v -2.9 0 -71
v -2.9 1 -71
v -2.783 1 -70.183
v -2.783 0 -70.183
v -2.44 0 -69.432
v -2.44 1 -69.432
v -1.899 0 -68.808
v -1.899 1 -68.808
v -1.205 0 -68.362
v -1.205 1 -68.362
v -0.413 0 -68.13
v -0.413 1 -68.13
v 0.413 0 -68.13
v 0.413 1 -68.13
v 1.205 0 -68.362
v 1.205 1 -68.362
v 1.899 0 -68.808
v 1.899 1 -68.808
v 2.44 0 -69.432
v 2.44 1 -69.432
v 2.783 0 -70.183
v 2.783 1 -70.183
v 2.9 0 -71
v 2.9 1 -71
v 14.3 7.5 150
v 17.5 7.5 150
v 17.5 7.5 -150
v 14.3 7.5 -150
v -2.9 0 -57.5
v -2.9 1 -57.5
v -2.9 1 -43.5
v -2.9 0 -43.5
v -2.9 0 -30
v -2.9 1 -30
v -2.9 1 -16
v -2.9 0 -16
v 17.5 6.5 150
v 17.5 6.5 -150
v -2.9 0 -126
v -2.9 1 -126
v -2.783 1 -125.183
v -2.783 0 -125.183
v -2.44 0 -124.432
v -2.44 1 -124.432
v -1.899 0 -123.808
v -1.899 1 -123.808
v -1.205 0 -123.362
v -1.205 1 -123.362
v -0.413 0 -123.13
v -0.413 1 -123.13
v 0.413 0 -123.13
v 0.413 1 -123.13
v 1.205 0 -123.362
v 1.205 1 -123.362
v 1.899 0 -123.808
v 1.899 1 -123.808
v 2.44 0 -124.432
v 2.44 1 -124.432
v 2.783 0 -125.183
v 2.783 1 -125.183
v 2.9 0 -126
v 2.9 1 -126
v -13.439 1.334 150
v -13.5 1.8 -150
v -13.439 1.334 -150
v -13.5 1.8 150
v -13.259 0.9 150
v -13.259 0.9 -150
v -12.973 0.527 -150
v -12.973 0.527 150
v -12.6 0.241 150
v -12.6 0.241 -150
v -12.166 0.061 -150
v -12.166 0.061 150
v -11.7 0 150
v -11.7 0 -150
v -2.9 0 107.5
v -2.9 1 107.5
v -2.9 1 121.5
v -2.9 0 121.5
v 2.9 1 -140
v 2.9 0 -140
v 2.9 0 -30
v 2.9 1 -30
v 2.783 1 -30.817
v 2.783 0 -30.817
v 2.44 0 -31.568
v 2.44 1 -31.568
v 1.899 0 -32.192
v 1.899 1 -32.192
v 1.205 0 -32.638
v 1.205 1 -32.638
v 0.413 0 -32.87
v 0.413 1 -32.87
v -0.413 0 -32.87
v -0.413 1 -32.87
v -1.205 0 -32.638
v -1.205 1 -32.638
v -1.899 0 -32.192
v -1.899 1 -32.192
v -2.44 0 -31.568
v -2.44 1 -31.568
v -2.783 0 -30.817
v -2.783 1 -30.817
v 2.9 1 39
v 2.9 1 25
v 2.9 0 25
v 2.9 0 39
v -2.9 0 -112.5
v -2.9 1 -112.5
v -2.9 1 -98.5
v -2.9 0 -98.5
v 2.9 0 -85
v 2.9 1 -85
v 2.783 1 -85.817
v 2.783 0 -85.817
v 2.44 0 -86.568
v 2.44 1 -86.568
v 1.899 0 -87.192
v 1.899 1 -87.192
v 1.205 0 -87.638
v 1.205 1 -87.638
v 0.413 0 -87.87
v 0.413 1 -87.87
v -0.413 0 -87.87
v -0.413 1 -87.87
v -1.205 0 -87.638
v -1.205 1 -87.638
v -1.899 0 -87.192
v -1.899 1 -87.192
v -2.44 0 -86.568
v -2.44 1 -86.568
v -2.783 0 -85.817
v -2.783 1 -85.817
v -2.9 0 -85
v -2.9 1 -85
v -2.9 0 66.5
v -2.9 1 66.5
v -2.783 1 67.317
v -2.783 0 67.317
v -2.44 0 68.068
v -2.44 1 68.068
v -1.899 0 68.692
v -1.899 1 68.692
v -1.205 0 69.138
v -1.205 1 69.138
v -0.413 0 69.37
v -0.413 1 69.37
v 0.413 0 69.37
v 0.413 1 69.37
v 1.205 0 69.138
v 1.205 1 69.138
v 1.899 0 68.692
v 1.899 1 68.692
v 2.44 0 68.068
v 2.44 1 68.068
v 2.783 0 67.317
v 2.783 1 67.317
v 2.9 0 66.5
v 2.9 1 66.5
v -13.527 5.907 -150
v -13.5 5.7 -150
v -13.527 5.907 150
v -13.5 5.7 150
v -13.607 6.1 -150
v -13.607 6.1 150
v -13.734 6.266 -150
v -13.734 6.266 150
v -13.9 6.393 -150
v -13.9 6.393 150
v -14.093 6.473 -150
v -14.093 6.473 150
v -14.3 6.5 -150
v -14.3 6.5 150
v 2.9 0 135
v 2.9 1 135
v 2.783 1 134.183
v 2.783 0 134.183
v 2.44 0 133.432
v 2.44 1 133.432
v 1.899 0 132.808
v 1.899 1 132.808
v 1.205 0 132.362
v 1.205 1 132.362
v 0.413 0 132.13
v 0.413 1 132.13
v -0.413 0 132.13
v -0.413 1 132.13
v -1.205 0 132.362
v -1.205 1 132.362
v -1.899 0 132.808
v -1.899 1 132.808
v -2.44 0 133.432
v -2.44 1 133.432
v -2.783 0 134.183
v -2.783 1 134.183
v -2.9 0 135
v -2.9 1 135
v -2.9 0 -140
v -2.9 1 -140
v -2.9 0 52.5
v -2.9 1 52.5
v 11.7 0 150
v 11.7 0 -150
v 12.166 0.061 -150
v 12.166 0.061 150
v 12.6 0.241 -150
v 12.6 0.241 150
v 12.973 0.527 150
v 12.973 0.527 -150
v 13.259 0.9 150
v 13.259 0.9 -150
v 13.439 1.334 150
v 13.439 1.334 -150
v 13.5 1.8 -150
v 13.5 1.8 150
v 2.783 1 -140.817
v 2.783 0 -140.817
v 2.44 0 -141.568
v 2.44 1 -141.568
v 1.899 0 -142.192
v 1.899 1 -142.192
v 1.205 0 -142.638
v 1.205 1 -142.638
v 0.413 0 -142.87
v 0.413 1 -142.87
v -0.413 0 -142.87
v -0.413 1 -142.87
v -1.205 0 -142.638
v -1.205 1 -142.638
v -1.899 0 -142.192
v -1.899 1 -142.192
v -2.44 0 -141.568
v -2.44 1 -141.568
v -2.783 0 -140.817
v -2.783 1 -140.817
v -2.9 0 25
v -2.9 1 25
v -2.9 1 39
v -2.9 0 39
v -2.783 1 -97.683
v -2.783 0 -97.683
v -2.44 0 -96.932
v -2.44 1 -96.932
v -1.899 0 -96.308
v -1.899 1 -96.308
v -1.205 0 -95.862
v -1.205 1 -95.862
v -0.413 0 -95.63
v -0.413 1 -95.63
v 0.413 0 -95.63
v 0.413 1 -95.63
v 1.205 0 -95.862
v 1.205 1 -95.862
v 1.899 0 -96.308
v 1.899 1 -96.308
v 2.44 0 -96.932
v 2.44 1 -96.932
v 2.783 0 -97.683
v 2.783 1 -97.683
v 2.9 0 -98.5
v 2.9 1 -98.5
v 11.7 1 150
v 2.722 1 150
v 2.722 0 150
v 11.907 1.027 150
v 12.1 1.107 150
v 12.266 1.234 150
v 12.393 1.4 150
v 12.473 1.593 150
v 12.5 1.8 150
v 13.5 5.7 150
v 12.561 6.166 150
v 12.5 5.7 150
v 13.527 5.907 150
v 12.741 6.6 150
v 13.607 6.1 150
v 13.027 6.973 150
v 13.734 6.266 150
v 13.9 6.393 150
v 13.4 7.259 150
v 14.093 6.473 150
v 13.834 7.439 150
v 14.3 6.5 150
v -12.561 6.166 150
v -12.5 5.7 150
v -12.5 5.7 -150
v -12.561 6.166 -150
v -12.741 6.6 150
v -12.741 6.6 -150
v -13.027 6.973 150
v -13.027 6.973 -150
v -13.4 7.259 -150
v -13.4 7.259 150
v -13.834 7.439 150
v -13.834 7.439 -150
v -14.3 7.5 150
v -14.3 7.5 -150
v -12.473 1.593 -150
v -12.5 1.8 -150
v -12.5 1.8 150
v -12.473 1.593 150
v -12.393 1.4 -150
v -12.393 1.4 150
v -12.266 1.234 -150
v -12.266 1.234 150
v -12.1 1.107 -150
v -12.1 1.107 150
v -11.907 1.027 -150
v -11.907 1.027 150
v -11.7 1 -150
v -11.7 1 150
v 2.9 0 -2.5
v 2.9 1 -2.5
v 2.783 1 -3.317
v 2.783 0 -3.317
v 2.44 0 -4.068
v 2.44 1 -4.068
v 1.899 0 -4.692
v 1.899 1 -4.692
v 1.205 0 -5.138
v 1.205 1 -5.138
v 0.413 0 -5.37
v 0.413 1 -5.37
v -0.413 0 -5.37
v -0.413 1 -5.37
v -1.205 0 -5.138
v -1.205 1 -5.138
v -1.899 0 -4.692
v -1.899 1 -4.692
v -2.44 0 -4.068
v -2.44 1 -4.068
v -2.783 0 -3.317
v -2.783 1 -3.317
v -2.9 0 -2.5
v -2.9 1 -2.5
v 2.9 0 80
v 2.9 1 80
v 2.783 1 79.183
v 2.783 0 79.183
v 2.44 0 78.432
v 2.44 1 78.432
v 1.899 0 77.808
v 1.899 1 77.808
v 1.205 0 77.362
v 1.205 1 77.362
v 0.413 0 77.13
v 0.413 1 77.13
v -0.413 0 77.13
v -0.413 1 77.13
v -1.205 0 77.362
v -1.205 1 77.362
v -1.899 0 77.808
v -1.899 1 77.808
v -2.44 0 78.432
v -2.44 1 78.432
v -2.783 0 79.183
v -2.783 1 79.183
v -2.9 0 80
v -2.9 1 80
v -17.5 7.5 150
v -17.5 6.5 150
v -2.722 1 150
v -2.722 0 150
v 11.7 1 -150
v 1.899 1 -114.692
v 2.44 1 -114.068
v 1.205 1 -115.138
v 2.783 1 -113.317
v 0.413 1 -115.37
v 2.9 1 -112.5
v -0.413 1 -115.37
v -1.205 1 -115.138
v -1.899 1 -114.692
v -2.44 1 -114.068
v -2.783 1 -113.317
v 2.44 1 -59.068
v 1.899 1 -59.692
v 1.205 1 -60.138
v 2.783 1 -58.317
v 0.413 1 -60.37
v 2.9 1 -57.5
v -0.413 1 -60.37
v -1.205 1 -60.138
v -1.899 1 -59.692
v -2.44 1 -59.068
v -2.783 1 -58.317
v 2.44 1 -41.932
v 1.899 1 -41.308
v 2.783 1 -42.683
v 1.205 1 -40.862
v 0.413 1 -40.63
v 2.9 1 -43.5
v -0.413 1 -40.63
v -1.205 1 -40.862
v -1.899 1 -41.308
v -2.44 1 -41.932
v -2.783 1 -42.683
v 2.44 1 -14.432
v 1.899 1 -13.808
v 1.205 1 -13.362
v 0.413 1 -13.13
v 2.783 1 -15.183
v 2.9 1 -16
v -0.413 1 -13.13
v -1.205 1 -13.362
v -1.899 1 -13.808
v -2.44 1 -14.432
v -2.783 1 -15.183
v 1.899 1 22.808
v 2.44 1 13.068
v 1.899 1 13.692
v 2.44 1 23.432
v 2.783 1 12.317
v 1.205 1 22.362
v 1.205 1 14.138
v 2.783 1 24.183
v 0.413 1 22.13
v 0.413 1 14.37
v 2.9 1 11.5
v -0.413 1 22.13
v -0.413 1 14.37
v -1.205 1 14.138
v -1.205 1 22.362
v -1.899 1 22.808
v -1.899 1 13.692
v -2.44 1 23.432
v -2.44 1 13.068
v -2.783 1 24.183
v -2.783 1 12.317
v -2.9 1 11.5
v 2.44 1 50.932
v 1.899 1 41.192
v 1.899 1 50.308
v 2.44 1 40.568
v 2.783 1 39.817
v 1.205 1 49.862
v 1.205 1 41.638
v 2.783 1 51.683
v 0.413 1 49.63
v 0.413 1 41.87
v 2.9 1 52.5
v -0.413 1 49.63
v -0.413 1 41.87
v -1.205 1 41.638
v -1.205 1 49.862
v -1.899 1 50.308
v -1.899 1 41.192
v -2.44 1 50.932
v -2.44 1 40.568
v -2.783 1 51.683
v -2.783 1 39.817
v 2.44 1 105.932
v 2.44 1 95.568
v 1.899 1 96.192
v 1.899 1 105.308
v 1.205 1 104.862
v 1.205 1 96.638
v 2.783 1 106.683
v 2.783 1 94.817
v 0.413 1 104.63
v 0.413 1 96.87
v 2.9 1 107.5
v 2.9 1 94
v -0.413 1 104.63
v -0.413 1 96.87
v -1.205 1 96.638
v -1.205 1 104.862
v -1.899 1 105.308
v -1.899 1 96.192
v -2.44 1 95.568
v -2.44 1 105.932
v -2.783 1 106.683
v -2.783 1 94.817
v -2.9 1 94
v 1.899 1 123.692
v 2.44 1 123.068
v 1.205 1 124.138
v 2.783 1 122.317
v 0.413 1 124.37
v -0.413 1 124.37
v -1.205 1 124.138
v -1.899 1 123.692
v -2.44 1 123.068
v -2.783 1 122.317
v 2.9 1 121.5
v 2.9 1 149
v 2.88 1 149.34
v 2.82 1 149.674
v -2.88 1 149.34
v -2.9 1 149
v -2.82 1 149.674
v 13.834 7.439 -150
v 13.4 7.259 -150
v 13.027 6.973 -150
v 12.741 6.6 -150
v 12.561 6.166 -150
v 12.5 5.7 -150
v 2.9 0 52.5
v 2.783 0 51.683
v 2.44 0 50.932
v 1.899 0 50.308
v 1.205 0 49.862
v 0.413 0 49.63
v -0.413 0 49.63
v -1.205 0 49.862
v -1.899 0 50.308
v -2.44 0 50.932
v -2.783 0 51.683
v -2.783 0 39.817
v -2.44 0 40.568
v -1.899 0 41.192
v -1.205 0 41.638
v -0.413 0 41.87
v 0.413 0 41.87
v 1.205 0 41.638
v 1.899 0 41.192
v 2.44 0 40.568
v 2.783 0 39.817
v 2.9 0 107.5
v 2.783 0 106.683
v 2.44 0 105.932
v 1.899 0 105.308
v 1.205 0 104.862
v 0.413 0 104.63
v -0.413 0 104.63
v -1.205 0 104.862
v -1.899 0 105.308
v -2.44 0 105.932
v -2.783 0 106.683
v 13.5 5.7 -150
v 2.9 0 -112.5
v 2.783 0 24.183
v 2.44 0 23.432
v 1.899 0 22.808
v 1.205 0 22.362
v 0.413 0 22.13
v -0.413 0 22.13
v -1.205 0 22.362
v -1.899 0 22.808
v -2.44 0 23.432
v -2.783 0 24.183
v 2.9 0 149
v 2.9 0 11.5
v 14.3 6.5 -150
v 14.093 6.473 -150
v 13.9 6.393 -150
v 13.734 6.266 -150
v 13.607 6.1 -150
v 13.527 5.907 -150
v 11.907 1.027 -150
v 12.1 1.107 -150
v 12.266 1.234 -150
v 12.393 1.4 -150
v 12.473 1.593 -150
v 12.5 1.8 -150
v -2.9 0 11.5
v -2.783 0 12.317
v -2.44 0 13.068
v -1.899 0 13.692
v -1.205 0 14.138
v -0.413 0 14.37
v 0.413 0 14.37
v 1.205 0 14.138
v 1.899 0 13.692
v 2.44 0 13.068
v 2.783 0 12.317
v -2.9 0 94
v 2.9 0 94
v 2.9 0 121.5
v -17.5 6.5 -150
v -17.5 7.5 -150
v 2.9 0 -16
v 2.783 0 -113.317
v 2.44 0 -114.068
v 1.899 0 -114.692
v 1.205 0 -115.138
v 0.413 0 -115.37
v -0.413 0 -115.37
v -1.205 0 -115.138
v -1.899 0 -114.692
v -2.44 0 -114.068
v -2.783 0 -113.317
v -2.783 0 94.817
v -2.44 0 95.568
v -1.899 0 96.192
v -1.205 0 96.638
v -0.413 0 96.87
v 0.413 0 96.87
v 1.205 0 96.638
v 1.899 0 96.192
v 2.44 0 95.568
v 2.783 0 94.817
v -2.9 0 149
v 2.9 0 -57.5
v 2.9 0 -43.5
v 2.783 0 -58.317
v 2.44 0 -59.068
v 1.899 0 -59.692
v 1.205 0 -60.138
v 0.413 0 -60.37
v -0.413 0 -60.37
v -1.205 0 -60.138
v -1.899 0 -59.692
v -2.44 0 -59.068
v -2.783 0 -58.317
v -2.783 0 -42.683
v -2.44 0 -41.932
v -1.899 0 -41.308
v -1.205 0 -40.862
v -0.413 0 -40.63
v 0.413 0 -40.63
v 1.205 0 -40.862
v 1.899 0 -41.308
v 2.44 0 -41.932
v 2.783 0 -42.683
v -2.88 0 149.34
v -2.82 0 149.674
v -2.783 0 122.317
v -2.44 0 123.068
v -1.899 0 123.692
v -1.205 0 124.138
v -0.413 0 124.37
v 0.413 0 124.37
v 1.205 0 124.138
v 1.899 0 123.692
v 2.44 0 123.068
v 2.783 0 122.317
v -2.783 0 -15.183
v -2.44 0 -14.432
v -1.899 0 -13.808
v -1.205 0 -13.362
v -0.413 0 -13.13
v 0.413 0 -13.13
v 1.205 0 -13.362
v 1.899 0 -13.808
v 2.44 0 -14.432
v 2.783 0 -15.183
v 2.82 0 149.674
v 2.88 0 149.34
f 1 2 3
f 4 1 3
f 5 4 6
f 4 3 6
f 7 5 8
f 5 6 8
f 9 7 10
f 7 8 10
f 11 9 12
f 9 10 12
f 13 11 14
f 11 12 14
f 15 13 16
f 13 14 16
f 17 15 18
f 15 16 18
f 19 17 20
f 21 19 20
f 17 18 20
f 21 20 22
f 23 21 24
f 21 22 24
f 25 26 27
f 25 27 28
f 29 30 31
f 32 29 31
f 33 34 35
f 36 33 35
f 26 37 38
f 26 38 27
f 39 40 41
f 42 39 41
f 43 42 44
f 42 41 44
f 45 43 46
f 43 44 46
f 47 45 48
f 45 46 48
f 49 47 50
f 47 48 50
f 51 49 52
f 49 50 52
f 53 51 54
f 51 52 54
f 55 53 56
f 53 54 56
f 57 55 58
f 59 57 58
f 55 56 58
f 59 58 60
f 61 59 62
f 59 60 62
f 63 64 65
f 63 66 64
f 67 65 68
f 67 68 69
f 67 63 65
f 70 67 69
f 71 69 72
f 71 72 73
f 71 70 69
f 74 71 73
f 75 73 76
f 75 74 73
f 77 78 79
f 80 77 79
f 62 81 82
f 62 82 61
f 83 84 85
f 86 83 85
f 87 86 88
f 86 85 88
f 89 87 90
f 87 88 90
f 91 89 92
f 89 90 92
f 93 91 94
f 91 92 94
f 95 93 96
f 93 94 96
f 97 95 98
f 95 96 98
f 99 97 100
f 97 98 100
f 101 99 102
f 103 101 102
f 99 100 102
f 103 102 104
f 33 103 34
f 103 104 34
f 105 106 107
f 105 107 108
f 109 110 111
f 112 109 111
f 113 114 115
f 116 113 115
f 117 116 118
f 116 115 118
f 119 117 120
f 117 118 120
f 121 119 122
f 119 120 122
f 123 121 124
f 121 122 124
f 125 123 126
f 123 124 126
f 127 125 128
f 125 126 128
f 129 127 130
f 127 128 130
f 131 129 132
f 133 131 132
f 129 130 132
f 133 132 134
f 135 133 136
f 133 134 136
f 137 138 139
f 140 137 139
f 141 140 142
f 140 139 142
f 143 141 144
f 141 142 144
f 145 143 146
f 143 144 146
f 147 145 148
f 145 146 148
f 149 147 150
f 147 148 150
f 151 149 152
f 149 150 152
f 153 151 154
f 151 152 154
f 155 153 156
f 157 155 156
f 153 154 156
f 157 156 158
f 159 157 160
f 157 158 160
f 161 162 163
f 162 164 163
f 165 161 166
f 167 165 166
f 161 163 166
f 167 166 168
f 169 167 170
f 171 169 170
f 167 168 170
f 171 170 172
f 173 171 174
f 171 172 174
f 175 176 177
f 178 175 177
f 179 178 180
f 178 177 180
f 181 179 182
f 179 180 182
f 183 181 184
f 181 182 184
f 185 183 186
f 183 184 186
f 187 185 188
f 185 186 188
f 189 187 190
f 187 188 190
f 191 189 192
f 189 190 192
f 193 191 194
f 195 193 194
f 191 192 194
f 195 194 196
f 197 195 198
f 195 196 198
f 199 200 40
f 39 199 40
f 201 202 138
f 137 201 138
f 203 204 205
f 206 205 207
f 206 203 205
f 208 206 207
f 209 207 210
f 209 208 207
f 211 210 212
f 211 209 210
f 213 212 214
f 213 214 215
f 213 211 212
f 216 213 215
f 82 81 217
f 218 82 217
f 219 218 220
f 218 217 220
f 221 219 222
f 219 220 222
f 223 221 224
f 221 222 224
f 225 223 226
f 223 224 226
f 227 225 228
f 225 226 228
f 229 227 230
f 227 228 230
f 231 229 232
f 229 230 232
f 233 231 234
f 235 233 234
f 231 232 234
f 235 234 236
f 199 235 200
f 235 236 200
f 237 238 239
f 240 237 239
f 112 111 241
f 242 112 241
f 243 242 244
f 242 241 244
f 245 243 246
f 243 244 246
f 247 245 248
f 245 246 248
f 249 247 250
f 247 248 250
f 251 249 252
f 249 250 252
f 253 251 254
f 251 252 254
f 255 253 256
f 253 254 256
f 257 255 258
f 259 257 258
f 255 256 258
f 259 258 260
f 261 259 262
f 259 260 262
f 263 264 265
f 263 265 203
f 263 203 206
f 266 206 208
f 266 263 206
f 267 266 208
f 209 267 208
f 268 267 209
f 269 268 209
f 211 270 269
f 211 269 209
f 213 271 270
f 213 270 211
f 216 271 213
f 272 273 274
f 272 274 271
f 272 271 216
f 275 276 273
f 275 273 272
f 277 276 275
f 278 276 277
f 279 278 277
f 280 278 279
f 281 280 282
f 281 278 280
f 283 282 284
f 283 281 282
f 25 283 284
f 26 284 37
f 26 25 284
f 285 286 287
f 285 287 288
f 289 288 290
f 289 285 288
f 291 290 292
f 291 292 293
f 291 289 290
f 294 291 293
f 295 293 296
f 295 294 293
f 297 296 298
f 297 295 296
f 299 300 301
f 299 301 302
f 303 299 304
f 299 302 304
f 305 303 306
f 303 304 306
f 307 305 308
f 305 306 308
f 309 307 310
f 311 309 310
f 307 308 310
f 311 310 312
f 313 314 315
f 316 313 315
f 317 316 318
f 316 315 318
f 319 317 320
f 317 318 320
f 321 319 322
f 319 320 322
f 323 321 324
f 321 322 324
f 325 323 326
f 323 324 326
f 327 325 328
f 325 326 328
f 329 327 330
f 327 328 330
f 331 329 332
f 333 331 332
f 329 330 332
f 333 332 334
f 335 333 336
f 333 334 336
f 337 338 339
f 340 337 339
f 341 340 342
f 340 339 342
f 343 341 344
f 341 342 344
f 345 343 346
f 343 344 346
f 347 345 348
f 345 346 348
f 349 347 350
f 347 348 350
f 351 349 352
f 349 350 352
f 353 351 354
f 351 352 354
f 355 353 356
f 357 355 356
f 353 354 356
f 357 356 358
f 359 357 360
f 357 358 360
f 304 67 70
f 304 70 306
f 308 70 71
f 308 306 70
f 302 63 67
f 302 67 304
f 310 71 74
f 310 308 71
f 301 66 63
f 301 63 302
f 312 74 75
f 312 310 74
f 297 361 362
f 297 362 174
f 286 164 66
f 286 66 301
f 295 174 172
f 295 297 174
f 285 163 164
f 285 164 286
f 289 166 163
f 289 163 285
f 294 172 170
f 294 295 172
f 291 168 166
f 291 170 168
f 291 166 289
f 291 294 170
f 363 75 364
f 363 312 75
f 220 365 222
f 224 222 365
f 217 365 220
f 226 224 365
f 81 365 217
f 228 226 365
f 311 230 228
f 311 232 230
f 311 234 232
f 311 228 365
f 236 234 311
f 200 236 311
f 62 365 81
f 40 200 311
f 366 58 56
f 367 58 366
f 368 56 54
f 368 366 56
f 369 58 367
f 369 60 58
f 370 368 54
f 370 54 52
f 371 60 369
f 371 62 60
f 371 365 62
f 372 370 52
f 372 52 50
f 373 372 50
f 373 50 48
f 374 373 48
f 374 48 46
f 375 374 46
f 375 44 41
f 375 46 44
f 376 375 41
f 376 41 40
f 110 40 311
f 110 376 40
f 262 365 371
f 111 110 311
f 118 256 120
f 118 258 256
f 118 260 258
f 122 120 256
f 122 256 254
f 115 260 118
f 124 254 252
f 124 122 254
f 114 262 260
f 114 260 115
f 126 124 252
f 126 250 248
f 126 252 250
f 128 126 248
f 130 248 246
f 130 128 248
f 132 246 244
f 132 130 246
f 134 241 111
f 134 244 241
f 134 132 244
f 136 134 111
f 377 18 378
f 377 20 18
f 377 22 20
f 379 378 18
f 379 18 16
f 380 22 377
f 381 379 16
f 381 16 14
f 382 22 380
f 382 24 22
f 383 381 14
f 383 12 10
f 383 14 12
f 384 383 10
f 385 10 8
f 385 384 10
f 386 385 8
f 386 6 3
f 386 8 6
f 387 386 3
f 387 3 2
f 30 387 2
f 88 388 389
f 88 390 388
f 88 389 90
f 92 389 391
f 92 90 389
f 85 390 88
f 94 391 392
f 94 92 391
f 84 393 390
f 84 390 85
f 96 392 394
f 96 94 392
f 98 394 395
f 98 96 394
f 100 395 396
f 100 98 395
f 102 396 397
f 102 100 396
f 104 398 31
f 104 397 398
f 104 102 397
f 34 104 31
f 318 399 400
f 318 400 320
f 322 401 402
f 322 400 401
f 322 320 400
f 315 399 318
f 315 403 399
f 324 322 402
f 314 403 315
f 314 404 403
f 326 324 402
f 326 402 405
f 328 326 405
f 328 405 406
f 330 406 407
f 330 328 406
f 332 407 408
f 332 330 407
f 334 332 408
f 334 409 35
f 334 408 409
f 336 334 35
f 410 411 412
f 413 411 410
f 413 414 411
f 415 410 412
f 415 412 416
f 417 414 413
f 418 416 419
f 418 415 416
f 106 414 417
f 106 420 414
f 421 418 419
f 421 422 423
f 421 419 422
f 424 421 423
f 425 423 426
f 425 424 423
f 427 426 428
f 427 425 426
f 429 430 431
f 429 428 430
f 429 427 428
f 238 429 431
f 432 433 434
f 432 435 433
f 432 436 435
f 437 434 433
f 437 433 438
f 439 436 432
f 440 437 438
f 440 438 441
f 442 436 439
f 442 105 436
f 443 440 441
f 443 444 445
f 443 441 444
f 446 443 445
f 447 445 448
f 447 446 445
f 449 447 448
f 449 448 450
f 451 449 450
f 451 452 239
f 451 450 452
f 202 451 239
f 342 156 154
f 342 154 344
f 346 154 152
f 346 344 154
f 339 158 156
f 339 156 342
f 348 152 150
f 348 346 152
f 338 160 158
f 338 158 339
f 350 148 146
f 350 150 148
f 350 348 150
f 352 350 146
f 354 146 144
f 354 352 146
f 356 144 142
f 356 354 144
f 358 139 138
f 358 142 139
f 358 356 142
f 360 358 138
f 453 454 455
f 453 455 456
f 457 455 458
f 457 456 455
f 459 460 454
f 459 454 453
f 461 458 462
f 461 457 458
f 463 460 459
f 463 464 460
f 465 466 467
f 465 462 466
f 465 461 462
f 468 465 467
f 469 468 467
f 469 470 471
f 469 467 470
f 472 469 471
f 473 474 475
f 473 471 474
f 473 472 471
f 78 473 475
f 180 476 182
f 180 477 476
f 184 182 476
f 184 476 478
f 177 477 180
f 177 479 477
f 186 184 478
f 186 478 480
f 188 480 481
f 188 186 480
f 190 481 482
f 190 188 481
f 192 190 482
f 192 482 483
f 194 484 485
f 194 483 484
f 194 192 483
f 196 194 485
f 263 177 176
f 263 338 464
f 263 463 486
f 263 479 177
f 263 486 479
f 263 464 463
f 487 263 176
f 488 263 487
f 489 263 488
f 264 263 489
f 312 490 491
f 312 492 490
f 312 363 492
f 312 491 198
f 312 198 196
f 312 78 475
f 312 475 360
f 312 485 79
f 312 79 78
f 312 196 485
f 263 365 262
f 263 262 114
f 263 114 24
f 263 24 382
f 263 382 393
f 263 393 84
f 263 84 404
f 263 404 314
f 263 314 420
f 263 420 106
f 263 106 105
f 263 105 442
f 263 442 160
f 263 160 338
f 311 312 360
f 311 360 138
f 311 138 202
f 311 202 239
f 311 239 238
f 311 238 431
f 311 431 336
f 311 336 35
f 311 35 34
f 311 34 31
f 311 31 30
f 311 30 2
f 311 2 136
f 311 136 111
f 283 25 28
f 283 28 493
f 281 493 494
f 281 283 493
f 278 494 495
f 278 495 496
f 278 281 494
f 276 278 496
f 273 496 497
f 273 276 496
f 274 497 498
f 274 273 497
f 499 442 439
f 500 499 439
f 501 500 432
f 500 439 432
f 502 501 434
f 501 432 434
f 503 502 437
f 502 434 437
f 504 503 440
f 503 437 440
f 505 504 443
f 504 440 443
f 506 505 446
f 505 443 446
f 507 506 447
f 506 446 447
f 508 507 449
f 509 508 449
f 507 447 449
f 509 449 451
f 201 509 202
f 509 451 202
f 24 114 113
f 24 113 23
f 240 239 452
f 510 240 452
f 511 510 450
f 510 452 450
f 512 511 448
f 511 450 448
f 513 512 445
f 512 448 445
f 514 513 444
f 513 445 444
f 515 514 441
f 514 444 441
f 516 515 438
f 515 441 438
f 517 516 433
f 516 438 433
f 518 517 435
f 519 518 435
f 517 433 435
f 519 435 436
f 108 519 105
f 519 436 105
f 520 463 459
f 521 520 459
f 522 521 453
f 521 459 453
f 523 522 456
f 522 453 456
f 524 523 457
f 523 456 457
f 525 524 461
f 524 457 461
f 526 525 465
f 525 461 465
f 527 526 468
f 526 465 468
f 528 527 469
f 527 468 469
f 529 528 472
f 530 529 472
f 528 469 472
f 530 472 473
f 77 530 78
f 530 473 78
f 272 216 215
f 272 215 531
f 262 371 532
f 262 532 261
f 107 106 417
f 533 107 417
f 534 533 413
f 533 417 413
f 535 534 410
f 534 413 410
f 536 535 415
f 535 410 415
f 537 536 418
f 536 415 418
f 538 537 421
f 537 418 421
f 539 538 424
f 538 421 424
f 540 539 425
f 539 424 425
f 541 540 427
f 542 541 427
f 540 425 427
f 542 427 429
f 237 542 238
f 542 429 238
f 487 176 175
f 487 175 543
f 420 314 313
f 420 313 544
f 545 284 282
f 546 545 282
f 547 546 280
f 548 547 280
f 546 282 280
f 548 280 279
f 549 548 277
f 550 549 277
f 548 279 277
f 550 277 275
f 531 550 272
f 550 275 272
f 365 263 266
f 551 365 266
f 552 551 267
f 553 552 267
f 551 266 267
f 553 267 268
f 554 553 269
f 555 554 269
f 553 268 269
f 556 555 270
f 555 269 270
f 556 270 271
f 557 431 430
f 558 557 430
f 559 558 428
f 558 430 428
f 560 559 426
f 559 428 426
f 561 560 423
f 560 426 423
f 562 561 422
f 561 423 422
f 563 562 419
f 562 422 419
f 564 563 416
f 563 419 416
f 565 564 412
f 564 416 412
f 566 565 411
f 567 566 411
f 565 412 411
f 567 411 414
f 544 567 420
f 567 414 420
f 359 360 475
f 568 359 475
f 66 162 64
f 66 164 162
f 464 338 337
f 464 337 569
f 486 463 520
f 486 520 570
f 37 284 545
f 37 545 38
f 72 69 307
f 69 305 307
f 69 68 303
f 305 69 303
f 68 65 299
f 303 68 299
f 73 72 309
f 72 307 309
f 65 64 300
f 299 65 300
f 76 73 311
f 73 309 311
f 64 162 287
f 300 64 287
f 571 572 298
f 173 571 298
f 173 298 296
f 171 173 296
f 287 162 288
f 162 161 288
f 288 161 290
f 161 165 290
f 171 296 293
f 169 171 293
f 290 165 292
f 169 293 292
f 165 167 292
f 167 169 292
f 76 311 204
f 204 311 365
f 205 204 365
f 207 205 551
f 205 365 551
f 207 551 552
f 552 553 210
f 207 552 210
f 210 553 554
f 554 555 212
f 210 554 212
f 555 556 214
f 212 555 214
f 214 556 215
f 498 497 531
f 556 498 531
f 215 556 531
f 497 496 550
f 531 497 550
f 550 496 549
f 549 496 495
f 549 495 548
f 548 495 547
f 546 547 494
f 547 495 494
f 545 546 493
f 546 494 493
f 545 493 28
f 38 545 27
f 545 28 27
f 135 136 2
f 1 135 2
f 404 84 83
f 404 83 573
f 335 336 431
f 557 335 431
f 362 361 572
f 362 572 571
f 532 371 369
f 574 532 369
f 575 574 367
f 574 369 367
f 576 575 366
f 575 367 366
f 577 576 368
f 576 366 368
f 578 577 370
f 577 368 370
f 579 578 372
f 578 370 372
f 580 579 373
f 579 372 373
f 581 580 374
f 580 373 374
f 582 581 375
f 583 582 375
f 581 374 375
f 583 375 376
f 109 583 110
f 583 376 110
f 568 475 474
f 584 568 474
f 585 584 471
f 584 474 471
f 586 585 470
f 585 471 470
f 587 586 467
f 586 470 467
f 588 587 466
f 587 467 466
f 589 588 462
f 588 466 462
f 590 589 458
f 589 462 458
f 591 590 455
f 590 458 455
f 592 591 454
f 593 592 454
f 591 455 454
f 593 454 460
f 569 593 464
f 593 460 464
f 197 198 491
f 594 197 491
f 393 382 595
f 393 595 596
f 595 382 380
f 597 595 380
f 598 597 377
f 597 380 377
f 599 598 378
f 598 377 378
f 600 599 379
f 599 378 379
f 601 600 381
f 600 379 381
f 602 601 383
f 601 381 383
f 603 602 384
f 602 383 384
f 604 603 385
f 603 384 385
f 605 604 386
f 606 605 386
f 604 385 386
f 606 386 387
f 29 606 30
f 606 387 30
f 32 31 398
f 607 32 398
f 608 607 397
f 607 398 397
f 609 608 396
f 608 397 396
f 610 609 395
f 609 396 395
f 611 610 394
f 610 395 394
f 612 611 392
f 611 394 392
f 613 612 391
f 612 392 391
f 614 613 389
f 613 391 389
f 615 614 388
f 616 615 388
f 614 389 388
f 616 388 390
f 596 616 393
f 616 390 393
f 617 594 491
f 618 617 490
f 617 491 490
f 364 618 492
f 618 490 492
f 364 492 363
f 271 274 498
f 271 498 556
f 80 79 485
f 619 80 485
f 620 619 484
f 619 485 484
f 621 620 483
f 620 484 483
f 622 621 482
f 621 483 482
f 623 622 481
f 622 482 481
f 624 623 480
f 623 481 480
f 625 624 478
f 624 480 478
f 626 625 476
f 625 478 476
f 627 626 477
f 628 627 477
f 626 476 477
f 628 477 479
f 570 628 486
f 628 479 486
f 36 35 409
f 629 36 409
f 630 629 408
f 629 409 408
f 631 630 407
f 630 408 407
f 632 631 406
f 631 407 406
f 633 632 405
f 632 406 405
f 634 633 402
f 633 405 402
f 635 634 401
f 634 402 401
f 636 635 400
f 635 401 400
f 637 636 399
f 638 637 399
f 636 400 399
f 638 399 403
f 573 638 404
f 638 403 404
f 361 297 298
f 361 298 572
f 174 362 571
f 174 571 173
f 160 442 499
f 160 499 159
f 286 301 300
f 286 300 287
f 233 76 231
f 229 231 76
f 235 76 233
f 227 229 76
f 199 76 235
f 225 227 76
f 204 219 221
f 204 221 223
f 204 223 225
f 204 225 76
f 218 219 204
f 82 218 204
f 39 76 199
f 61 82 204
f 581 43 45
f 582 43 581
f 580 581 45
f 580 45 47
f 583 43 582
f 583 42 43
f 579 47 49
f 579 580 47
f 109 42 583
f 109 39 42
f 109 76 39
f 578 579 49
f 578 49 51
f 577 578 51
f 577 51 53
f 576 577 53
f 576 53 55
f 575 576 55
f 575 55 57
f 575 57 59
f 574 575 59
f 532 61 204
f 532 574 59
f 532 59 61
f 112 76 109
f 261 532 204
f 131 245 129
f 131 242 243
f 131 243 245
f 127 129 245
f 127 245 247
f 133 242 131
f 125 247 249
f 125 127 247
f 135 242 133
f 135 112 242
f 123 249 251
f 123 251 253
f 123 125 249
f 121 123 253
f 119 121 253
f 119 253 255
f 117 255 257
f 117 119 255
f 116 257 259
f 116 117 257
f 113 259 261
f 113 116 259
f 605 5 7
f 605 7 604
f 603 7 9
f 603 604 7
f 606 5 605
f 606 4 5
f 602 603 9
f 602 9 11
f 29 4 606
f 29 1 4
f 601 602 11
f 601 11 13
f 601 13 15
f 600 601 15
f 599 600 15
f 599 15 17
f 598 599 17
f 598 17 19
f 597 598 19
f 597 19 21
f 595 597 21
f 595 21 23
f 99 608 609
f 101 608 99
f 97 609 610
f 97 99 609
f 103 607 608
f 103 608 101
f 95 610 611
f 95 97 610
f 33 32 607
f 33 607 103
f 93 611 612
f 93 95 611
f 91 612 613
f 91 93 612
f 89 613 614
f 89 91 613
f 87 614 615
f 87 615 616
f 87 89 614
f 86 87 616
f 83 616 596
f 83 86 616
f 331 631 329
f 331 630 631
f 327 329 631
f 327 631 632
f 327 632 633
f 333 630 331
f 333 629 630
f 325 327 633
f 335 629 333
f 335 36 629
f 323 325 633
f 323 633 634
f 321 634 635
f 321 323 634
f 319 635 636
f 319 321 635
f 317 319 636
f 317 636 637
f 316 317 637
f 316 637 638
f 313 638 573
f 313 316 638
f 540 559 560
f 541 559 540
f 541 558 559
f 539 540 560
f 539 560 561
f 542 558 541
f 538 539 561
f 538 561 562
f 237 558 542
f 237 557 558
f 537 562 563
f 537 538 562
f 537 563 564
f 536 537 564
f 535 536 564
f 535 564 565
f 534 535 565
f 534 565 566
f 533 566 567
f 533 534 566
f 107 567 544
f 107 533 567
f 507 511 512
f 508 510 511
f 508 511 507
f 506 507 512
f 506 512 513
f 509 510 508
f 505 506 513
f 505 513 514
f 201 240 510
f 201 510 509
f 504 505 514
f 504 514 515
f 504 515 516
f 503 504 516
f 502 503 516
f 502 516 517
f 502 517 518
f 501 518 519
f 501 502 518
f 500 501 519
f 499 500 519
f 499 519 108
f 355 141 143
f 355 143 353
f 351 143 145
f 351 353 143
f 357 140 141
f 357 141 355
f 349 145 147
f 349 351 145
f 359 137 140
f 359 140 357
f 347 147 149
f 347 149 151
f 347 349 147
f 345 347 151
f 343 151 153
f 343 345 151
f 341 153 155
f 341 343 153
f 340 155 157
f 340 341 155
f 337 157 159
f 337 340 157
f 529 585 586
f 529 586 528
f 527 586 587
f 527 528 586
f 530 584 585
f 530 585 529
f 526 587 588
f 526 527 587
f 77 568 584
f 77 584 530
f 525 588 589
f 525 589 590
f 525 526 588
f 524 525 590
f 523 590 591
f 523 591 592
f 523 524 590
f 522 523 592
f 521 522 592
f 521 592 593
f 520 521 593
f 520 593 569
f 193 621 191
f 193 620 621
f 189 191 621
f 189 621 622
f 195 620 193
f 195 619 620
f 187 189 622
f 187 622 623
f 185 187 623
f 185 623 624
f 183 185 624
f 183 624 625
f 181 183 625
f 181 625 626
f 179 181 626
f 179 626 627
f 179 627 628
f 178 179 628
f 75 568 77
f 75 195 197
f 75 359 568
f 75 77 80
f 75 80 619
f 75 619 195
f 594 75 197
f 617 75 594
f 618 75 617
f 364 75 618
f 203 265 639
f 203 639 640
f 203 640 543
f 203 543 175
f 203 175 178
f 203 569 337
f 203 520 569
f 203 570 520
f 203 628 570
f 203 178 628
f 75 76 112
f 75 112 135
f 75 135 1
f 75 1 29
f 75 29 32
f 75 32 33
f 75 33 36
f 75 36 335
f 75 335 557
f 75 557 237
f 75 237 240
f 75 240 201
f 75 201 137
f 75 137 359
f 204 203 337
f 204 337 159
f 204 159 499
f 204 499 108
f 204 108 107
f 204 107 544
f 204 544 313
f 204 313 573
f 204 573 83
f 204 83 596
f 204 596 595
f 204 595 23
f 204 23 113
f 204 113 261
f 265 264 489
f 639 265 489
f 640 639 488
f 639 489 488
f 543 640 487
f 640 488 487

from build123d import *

# Parameters (mm, degrees)
PAD_DEPTH           = 150
POCKET_DEPTH        = 5
LINEARPATTERN_COUNT = 11
LINEARPATTERN_PITCH = 27.5


with BuildPart() as part:
    # Sketch → Pad (new body, symmetric)
    with BuildSketch(Plane.XY):
        with BuildLine():
            Line((-11.7, 0), (11.7, 0))
            ThreePointArc((11.7, 0), (12.972792, 0.527208), (13.5, 1.8))
            Line((13.5, 1.8), (13.5, 5.7))
            ThreePointArc((14.3, 6.5), (13.734315, 6.265685), (13.5, 5.7))
            Line((14.3, 6.5), (17.5, 6.5))
            Line((17.5, 6.5), (17.5, 7.5))
            Line((17.5, 7.5), (14.3, 7.5))
            ThreePointArc((14.3, 7.5), (13.027208, 6.972792), (12.5, 5.7))
            Line((12.5, 5.7), (12.5, 1.8))
            ThreePointArc((11.7, 1), (12.265685, 1.234315), (12.5, 1.8))
            Line((11.7, 1), (-11.7, 1))
            ThreePointArc((-12.5, 1.8), (-12.265685, 1.234315), (-11.7, 1))
            Line((-12.5, 1.8), (-12.5, 5.7))
            ThreePointArc((-12.5, 5.7), (-13.027208, 6.972792), (-14.3, 7.5))
            Line((-14.3, 7.5), (-17.5, 7.5))
            Line((-17.5, 7.5), (-17.5, 6.5))
            Line((-17.5, 6.5), (-14.3, 6.5))
            ThreePointArc((-13.5, 5.7), (-13.734315, 6.265685), (-14.3, 6.5))
            Line((-13.5, 5.7), (-13.5, 1.8))
            ThreePointArc((-13.5, 1.8), (-12.972792, 0.527208), (-11.7, 0))
        make_face()
    extrude(amount=PAD_DEPTH, both=True)

    # Sketch001 (on Face13 of Pad) → Pocket (cut)
    with BuildSketch(Plane(origin=(0, 1, 0), x_dir=(-1, 0, 0), z_dir=(0, 1, 0))):
        with BuildLine():
            ThreePointArc((-2.9, -140), (0, -142.9), (2.9, -140))
            Line((2.9, -140), (2.9, -126))
            ThreePointArc((2.9, -126), (0, -123.1), (-2.9, -126))
            Line((-2.9, -140), (-2.9, -126))
        make_face()
    pocket = extrude(amount=-POCKET_DEPTH, mode=Mode.SUBTRACT)

    # LinearPattern: Pocket ×11
    with Locations(*[(0, 0, i * LINEARPATTERN_PITCH) for i in range(1, LINEARPATTERN_COUNT)]):
        add(pocket, mode=Mode.SUBTRACT)


solid = part.part
